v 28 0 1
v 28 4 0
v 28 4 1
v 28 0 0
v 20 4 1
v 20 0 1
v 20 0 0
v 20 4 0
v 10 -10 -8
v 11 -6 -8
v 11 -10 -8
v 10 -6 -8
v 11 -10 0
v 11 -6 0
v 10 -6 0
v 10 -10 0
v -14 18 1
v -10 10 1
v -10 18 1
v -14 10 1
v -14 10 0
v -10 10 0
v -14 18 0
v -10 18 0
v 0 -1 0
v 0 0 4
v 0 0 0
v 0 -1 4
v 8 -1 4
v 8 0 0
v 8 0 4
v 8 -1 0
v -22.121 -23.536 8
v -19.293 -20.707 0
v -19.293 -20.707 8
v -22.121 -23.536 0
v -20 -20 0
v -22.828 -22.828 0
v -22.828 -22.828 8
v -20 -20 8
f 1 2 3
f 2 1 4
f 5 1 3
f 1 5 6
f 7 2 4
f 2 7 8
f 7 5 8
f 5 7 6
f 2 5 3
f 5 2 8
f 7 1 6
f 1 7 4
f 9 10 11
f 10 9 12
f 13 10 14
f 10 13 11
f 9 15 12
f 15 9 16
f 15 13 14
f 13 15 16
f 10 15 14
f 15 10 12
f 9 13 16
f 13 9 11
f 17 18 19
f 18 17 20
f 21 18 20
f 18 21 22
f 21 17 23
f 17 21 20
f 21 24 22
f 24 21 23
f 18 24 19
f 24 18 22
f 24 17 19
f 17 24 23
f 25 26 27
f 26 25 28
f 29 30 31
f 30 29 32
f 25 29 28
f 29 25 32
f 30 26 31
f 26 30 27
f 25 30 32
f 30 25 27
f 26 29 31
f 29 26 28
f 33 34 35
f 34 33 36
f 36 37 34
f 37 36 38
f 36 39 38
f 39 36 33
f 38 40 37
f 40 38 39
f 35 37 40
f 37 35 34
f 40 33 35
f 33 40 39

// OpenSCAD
// Copyright Stephen Morrisson 2018
// All rights reserved


module cBlock(c, Size)
{
    color(c)
        cube(Size);
}
//cBlock("blue", [2,3,4]);

module tBlock(c, Offset, Size)
{
    translate(Offset) cBlock(c, Size);
}
//tBlock("green", [10,20,1], [2,4,6]);

module rBlock(c, Rot, Size)
{
    rotate(Rot) cBlock(c, Size);
}
//rBlock("blue", [45,90,135], [2,4,6]);

module trBlock(c, Offset, Rot, Size)
{
    translate(Offset) rBlock(c, Rot, Size);
}
//trBlock("blue", [1,2,3], [45,90,135], [2,4,6]);


module testBlocks()
{
    Sz = [8, 4, 1];

    trBlock("orange", [20,0,0],  [0,0,0], Sz);
    trBlock("blue", [10, -10, 0], [0, 90, 0], Sz);
    trBlock("gray", [-10, 10, 0], [0,0,90], Sz);
    trBlock("yellow", [0,0,0], [90,0,0], Sz);
    trBlock("green", [-20,-20,0], [90,270,45], Sz);
}

testBlocks();
